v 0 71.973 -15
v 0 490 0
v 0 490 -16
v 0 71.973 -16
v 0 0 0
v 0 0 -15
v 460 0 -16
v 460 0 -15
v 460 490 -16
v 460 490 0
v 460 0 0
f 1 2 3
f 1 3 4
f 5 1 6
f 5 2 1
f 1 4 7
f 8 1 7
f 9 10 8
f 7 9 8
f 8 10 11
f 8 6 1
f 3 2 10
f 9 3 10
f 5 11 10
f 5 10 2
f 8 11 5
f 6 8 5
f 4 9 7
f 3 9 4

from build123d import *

# Parameters (mm, degrees)
PAD_DEPTH    = 16
POCKET_DEPTH = 1


with BuildPart() as part:
    # Sketch → Pad (new body)
    with BuildSketch(Plane.XY):
        Polygon((0, 413.879036), (0, 490), (460, 490), (460, 0), (0, 0), align=None)
    extrude(amount=-PAD_DEPTH)

    # Sketch002 (on Face7 of Pad) → Pocket (cut)
    with BuildSketch(Plane(origin=(0, 0, -16), x_dir=(1, 0, 0), z_dir=(0, 0, -1))):
        Polygon((0, 0), (0, -71.973152), (460, 0), align=None)
    extrude(amount=-POCKET_DEPTH, mode=Mode.SUBTRACT)


solid = part.part
